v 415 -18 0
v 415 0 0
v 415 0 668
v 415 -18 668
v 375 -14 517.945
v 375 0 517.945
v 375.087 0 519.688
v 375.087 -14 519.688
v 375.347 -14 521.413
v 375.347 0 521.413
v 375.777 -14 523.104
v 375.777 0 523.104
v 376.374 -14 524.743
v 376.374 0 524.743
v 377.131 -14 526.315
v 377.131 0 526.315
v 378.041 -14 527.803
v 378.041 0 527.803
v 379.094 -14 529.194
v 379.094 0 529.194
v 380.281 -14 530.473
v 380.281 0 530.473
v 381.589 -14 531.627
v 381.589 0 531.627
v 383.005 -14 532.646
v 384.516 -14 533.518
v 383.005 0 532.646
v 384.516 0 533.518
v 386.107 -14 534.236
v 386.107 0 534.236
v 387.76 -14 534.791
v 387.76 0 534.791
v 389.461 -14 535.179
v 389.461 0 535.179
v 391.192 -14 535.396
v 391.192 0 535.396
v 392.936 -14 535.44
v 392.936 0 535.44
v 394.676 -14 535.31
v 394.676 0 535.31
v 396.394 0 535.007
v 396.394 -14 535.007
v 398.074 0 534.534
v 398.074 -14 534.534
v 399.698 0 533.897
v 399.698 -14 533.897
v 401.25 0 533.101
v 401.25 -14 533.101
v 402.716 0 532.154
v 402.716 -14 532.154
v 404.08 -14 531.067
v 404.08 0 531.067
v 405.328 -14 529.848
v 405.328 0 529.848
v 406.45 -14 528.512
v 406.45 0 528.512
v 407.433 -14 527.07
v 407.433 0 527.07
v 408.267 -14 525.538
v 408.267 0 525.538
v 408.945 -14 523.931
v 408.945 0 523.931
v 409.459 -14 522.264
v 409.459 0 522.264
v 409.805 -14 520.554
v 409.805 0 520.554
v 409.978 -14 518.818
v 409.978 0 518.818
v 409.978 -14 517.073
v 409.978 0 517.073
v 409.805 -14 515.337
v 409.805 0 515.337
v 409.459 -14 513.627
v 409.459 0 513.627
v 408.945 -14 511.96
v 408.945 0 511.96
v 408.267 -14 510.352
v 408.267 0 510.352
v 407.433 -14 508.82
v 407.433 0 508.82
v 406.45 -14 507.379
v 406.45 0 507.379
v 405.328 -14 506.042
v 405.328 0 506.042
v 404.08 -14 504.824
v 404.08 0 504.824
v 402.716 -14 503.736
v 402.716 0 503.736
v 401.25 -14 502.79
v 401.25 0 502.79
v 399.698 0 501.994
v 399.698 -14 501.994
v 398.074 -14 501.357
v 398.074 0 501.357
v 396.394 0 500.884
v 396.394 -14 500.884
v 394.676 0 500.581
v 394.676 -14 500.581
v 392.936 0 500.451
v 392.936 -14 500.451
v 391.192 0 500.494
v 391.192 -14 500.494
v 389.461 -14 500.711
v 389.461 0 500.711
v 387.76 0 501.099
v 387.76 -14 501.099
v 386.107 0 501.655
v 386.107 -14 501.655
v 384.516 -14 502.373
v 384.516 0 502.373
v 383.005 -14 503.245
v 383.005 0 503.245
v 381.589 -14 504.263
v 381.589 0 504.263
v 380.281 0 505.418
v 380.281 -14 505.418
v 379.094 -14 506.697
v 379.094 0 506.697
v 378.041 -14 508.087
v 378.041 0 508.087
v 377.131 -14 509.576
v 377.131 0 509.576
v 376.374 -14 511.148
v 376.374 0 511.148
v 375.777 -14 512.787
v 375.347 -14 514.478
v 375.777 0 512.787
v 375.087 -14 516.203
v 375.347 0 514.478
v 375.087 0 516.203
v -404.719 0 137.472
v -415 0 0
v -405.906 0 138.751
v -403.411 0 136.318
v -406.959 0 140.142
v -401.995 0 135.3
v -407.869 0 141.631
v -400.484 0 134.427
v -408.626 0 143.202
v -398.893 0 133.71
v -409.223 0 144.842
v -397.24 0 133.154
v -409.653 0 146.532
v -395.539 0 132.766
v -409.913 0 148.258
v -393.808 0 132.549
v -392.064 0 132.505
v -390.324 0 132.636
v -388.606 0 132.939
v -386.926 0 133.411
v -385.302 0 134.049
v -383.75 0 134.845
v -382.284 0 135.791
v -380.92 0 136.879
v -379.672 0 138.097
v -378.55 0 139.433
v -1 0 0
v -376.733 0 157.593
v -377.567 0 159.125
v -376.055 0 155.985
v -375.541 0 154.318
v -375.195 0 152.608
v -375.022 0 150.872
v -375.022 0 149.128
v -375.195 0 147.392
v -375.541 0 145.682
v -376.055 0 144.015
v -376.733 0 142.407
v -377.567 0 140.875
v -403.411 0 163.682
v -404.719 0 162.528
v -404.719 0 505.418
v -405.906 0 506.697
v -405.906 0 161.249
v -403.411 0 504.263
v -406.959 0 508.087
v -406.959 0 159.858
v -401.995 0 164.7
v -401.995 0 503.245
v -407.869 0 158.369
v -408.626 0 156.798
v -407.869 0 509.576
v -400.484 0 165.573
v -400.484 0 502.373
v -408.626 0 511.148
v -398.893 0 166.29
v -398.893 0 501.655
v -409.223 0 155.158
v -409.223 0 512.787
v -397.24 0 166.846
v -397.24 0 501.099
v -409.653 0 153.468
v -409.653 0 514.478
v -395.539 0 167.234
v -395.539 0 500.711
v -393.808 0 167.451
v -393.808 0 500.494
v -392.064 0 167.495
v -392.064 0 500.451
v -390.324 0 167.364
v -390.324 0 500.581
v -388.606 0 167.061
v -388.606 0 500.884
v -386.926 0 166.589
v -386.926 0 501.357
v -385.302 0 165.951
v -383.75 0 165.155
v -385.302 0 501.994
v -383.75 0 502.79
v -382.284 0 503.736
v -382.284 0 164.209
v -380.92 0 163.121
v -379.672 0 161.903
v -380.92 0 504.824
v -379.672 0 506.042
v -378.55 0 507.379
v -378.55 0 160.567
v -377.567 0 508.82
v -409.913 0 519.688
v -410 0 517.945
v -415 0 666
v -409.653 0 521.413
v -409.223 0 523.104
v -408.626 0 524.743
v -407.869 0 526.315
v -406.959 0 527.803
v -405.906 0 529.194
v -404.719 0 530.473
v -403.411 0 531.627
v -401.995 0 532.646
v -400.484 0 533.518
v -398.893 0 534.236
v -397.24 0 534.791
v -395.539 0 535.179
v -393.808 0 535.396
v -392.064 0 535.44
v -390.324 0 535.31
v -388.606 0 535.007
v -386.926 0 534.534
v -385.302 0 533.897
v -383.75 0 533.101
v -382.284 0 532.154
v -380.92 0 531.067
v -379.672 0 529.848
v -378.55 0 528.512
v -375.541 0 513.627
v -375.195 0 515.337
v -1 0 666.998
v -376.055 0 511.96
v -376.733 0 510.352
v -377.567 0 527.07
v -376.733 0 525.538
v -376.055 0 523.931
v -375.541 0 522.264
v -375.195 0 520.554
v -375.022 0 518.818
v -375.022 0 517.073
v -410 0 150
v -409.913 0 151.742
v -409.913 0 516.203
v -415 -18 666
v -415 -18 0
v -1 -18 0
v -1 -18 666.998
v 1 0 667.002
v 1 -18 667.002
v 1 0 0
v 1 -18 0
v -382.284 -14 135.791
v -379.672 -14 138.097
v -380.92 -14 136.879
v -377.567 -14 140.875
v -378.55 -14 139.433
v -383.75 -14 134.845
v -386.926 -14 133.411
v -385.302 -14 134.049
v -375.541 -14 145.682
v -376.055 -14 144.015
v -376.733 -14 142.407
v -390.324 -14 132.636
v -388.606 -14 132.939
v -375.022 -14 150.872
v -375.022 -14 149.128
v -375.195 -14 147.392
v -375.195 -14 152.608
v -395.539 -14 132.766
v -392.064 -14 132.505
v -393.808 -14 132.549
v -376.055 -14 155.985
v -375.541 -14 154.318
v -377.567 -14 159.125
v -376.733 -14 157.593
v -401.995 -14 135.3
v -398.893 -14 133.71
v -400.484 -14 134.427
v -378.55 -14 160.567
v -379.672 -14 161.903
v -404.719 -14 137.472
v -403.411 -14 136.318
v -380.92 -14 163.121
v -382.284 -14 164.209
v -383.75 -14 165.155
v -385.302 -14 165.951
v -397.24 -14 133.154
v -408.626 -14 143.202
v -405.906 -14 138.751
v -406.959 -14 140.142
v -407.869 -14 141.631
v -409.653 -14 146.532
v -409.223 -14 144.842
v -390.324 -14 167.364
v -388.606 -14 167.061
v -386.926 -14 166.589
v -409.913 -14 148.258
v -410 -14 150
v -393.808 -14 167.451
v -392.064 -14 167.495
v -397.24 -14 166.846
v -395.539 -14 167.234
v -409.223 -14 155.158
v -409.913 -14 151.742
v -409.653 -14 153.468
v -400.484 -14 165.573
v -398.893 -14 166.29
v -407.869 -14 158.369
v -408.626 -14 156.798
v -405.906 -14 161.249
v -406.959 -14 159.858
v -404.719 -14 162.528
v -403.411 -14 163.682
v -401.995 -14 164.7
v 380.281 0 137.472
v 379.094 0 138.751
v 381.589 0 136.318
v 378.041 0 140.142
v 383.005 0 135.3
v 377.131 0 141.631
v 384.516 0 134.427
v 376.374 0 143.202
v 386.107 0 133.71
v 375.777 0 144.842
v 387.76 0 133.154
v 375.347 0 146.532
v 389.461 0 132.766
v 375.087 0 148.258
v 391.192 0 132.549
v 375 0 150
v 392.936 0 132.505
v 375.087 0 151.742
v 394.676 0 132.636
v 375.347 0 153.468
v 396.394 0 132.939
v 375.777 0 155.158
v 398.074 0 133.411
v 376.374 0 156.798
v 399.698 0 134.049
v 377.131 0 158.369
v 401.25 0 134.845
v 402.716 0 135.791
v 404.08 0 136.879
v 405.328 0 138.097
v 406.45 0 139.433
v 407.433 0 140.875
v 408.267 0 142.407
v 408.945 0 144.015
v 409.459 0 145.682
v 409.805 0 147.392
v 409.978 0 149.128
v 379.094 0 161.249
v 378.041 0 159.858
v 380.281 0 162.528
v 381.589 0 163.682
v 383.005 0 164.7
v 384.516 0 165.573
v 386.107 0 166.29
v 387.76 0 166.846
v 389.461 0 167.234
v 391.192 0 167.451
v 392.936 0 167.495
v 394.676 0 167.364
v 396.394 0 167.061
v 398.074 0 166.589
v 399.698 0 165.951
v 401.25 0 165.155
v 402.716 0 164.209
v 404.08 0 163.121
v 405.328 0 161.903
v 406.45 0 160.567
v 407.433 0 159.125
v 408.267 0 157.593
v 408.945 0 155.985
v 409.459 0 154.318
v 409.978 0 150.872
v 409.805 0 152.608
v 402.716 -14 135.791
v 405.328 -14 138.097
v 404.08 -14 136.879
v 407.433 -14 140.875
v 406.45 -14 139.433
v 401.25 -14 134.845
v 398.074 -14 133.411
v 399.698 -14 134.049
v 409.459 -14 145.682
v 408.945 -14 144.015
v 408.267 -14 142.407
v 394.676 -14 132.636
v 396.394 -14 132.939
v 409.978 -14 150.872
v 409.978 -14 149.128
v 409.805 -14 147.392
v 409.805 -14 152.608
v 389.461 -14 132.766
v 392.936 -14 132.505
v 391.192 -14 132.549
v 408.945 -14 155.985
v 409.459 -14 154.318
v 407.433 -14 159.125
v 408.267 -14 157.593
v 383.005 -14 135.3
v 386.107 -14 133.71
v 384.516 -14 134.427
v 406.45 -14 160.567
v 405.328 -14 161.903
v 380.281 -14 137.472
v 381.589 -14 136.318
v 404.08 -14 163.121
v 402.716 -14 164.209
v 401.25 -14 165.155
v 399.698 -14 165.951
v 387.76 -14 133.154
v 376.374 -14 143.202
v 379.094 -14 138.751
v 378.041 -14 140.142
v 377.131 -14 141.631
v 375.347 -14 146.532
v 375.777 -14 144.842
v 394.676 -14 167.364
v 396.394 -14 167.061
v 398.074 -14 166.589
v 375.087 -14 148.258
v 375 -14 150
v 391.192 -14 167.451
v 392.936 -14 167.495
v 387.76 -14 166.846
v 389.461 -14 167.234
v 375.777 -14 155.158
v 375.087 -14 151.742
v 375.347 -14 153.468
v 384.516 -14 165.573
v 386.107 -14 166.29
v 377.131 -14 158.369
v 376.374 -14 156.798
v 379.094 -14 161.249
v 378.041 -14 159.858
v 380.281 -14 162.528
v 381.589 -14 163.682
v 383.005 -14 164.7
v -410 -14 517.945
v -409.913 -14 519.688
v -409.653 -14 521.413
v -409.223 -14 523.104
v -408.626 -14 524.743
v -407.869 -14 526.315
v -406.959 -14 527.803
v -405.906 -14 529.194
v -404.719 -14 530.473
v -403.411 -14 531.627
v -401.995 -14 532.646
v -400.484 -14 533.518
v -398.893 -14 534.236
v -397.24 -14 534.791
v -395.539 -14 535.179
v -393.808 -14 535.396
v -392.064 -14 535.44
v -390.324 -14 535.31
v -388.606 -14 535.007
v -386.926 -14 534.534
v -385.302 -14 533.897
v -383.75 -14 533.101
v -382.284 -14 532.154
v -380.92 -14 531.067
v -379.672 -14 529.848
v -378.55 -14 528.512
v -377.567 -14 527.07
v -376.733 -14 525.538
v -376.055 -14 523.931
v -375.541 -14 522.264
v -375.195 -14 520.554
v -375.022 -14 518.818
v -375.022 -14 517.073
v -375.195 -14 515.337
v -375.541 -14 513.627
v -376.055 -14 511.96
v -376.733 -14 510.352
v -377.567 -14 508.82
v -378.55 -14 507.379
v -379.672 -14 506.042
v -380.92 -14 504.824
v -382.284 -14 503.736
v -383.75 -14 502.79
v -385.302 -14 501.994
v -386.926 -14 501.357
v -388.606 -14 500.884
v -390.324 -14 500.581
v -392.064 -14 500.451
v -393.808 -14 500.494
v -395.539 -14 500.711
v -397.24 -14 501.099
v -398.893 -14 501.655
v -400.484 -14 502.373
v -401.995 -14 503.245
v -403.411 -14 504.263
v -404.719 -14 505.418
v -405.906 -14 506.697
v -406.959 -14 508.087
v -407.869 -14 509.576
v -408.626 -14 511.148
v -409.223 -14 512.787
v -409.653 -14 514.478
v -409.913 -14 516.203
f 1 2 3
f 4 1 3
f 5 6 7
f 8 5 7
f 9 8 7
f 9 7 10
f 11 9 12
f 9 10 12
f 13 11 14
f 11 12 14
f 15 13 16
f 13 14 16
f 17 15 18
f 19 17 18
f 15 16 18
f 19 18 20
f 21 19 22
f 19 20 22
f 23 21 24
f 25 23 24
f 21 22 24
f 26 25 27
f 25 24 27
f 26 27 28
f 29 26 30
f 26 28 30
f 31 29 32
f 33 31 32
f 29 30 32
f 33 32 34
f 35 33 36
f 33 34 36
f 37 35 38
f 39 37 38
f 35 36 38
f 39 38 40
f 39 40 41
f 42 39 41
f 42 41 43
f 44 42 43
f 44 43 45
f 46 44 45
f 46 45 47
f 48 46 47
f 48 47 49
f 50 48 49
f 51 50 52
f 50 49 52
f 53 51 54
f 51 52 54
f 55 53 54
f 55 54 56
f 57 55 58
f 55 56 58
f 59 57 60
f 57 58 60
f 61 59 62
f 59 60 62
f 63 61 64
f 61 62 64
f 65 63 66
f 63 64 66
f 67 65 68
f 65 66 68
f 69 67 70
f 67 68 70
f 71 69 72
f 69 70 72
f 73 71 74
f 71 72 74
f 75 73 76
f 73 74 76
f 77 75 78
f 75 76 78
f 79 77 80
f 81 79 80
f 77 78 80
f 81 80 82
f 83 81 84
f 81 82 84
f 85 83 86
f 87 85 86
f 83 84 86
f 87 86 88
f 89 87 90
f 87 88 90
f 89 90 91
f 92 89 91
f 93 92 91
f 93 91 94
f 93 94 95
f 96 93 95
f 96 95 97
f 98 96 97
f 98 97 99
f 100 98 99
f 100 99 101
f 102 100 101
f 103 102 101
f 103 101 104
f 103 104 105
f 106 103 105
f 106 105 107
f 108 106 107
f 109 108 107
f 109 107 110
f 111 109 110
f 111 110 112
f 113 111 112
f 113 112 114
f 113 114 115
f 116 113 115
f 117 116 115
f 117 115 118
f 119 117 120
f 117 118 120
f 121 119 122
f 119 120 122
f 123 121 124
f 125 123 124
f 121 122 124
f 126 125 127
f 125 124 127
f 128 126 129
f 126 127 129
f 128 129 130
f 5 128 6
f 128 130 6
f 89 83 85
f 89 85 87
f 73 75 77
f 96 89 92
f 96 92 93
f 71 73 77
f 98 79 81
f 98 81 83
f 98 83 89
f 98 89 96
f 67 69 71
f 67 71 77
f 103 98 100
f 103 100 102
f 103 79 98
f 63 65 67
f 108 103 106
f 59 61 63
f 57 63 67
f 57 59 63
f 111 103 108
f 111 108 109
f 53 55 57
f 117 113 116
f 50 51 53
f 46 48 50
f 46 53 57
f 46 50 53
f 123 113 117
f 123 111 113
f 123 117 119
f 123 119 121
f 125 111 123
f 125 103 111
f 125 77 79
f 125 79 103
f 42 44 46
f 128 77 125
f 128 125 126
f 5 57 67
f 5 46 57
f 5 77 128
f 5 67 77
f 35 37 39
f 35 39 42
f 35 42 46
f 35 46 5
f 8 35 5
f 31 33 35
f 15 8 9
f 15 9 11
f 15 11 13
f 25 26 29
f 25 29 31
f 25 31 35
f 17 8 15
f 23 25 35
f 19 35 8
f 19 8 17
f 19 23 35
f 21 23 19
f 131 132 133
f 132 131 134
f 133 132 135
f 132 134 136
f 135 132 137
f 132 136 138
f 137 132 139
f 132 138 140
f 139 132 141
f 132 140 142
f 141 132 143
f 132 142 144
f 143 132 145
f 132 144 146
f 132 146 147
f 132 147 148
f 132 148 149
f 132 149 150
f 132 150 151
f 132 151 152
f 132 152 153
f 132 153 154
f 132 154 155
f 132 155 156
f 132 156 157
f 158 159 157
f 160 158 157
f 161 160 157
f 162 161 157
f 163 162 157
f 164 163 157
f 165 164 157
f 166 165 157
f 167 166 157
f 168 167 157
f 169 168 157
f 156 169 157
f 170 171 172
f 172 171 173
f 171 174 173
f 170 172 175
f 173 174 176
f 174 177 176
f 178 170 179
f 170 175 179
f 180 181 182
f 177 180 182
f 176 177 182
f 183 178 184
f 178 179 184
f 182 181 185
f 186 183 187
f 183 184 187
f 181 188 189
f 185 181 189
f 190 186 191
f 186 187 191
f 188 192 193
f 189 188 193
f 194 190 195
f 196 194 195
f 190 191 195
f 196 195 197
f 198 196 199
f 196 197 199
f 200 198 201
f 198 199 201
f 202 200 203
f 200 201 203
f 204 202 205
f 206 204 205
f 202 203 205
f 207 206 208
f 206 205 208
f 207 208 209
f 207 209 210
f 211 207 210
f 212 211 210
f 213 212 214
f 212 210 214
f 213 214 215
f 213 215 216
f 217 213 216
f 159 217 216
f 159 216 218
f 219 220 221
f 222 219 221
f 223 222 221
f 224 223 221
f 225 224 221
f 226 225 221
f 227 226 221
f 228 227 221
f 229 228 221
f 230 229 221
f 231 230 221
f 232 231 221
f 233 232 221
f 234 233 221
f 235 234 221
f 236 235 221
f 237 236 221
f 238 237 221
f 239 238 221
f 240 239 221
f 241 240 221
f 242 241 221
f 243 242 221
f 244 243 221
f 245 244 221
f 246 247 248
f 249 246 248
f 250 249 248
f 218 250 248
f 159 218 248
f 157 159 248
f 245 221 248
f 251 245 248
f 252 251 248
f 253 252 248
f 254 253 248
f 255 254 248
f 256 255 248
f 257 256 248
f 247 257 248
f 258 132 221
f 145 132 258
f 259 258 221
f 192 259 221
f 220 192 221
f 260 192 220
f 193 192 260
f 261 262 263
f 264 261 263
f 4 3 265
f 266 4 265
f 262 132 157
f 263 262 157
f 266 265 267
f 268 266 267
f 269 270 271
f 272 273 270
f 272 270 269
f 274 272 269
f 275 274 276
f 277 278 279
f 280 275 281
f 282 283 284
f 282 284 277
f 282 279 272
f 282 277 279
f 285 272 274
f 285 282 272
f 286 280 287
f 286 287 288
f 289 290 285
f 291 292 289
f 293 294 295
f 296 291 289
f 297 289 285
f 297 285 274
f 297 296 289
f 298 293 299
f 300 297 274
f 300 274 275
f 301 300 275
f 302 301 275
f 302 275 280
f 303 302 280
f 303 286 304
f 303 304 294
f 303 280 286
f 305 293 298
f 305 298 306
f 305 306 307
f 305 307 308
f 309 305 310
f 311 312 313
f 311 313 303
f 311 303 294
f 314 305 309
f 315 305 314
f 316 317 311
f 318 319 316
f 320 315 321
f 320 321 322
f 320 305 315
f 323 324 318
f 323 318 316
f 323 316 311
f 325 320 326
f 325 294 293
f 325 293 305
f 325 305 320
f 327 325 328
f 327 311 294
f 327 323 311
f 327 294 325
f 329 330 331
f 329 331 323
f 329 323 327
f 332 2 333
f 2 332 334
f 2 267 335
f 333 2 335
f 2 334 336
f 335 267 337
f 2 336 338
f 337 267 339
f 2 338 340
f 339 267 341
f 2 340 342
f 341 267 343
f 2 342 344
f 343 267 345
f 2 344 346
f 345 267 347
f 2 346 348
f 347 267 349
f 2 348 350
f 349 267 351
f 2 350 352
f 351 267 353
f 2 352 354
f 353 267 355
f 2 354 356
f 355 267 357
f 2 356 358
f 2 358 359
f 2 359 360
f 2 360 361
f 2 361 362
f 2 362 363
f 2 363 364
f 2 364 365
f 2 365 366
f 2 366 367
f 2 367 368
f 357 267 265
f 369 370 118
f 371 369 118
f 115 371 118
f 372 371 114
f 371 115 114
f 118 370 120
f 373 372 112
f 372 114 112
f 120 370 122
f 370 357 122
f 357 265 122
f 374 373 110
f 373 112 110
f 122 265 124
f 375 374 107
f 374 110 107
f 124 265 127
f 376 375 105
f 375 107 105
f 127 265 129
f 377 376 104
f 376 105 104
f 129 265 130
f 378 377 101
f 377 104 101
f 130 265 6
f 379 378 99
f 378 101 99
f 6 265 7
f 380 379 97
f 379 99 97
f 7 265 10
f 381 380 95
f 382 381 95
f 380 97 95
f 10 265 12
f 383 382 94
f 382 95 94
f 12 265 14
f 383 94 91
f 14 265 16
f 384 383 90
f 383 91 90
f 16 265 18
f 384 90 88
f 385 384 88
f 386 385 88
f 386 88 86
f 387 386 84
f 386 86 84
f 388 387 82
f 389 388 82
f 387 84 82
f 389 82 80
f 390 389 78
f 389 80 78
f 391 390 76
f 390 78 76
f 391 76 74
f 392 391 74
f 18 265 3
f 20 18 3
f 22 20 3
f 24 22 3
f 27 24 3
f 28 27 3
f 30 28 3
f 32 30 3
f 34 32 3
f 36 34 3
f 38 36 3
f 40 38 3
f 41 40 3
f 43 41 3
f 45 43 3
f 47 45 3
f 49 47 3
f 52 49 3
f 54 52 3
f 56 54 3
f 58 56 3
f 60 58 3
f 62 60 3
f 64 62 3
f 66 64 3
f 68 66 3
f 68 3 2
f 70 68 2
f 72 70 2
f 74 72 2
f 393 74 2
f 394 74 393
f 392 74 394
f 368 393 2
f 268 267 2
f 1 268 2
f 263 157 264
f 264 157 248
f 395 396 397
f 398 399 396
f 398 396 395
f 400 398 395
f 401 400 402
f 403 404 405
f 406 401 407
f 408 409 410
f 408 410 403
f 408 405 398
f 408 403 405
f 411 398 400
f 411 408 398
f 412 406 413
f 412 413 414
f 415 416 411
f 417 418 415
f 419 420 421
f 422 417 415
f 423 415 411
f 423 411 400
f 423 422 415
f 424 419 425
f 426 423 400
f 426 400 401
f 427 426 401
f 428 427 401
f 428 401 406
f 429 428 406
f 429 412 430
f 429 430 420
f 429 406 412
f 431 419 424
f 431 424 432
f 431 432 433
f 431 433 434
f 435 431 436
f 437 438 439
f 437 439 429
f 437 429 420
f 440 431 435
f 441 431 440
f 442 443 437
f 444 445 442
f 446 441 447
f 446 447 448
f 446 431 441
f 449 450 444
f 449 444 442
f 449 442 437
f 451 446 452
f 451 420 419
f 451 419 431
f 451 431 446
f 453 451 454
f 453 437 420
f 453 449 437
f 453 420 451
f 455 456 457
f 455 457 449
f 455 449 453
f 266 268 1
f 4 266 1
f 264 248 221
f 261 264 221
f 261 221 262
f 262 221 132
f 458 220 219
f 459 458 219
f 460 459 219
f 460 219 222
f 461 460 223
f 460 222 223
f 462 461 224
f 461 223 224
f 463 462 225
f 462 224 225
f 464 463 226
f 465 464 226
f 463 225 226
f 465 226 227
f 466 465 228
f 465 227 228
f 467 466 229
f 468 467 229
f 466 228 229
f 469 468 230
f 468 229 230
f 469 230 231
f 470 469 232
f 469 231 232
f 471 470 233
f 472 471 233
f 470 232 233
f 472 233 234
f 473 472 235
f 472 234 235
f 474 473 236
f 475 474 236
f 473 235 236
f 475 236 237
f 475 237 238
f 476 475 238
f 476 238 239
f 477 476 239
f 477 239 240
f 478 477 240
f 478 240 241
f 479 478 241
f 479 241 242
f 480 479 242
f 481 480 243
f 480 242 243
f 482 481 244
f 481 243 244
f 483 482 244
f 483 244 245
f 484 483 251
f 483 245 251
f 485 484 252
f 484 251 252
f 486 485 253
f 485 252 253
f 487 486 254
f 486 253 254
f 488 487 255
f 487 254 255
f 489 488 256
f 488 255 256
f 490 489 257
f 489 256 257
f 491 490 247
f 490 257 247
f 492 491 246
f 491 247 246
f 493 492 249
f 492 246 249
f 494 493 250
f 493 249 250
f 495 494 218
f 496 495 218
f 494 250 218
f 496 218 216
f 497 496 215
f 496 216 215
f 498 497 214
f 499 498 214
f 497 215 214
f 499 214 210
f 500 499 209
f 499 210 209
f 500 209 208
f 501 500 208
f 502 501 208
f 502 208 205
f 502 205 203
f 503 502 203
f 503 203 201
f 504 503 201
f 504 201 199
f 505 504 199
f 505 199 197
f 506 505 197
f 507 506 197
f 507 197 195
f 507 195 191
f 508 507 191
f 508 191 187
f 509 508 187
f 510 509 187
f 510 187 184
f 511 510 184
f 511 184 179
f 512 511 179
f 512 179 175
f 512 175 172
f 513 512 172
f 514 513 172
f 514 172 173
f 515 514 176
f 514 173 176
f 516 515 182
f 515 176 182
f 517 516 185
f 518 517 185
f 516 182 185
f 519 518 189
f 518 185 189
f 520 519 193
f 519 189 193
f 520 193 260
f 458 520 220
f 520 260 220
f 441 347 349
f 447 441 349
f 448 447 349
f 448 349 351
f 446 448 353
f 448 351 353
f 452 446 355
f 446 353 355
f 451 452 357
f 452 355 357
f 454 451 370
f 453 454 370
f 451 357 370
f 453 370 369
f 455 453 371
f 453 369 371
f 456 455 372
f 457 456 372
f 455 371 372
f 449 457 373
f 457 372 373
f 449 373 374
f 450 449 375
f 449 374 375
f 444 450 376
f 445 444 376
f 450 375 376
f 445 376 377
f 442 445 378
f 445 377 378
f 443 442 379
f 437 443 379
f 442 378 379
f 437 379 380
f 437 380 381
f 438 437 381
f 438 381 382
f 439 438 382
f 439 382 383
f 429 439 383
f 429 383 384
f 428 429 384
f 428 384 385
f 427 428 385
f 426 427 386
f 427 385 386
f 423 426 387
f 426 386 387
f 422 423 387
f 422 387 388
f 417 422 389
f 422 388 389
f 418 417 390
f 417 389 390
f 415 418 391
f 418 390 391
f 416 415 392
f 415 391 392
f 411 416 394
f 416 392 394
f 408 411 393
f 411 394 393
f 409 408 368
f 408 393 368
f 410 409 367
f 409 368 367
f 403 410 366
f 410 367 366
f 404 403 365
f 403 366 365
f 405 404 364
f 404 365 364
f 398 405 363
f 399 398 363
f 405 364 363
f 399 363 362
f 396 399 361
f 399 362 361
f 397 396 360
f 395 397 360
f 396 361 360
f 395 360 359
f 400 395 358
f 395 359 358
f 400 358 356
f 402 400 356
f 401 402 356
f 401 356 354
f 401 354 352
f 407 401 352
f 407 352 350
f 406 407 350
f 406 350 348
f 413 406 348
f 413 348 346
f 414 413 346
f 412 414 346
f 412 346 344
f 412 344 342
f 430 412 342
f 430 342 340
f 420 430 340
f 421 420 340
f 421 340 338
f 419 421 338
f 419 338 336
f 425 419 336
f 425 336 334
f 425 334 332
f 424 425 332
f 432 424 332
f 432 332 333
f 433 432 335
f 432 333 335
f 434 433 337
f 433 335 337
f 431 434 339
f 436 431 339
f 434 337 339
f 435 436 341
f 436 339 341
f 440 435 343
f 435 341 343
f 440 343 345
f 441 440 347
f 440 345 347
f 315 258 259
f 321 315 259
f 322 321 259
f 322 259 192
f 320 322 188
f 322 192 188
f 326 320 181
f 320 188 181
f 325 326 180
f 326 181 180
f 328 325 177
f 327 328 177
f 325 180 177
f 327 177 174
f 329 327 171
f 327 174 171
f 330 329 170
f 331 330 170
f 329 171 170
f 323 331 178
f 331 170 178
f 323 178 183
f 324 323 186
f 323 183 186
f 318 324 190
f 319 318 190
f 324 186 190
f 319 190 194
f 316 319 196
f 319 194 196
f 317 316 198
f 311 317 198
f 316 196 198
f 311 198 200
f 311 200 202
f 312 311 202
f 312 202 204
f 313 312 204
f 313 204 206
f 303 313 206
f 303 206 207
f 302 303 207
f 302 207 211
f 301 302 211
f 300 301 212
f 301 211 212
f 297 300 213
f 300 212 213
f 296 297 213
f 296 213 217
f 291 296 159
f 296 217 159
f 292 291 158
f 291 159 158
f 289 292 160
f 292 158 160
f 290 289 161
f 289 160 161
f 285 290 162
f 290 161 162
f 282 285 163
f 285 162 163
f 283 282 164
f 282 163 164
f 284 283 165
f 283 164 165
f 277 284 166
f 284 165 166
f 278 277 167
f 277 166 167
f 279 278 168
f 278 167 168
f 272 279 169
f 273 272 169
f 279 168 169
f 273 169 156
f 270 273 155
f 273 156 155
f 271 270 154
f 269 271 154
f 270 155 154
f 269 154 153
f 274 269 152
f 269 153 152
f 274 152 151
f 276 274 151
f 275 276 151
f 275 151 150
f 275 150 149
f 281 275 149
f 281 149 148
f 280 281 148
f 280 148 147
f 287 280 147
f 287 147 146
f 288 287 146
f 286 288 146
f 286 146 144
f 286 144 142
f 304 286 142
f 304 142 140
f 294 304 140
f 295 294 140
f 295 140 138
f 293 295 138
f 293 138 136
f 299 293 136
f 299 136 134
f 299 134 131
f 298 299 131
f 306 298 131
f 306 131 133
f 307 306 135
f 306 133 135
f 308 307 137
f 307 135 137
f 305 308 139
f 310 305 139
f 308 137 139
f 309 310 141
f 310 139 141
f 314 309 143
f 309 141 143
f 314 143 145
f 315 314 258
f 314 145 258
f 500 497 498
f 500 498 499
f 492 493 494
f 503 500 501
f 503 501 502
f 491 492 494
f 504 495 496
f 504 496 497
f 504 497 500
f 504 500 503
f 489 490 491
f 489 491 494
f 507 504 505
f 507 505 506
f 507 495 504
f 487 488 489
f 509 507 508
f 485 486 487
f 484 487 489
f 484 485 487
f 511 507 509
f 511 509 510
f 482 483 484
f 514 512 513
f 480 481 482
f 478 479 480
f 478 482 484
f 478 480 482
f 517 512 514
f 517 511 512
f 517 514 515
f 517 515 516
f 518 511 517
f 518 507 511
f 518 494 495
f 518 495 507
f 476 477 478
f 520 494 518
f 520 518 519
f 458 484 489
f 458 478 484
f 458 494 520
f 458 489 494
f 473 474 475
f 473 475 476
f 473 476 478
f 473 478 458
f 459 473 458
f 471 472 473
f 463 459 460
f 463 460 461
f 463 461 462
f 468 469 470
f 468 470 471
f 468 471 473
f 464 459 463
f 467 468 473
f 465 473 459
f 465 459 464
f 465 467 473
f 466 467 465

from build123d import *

# Parameters (mm, degrees)
F1_DEPTH = 18
F2_R     = 17.5
F3_DEPTH = 14


with BuildPart() as f1:
    # F0 (on Front) → F1 (new body)
    with BuildSketch(Plane.XZ):
        Polygon((-1, 666.99759), (-415, 666), (-415, 0), (-1, 0), align=None)
        Polygon((415, 668), (1, 667.00241), (1, 0), (415, 0), align=None)
    extrude(amount=F1_DEPTH)

    # F2 (on face) → F3 (cut)
    with BuildSketch(Plane(origin=(0, 0, 0), x_dir=(-1, 0, 0), z_dir=(0, 1, 0))):
        with Locations((-392.5, 517.945348)):
            Circle(F2_R)
        with Locations((-392.5, 150)):
            Circle(F2_R)
        with Locations((392.5, 517.945348)):
            Circle(F2_R)
        with Locations((392.5, 150)):
            Circle(F2_R)
    extrude(amount=-F3_DEPTH, mode=Mode.SUBTRACT)


solid = f1.part
